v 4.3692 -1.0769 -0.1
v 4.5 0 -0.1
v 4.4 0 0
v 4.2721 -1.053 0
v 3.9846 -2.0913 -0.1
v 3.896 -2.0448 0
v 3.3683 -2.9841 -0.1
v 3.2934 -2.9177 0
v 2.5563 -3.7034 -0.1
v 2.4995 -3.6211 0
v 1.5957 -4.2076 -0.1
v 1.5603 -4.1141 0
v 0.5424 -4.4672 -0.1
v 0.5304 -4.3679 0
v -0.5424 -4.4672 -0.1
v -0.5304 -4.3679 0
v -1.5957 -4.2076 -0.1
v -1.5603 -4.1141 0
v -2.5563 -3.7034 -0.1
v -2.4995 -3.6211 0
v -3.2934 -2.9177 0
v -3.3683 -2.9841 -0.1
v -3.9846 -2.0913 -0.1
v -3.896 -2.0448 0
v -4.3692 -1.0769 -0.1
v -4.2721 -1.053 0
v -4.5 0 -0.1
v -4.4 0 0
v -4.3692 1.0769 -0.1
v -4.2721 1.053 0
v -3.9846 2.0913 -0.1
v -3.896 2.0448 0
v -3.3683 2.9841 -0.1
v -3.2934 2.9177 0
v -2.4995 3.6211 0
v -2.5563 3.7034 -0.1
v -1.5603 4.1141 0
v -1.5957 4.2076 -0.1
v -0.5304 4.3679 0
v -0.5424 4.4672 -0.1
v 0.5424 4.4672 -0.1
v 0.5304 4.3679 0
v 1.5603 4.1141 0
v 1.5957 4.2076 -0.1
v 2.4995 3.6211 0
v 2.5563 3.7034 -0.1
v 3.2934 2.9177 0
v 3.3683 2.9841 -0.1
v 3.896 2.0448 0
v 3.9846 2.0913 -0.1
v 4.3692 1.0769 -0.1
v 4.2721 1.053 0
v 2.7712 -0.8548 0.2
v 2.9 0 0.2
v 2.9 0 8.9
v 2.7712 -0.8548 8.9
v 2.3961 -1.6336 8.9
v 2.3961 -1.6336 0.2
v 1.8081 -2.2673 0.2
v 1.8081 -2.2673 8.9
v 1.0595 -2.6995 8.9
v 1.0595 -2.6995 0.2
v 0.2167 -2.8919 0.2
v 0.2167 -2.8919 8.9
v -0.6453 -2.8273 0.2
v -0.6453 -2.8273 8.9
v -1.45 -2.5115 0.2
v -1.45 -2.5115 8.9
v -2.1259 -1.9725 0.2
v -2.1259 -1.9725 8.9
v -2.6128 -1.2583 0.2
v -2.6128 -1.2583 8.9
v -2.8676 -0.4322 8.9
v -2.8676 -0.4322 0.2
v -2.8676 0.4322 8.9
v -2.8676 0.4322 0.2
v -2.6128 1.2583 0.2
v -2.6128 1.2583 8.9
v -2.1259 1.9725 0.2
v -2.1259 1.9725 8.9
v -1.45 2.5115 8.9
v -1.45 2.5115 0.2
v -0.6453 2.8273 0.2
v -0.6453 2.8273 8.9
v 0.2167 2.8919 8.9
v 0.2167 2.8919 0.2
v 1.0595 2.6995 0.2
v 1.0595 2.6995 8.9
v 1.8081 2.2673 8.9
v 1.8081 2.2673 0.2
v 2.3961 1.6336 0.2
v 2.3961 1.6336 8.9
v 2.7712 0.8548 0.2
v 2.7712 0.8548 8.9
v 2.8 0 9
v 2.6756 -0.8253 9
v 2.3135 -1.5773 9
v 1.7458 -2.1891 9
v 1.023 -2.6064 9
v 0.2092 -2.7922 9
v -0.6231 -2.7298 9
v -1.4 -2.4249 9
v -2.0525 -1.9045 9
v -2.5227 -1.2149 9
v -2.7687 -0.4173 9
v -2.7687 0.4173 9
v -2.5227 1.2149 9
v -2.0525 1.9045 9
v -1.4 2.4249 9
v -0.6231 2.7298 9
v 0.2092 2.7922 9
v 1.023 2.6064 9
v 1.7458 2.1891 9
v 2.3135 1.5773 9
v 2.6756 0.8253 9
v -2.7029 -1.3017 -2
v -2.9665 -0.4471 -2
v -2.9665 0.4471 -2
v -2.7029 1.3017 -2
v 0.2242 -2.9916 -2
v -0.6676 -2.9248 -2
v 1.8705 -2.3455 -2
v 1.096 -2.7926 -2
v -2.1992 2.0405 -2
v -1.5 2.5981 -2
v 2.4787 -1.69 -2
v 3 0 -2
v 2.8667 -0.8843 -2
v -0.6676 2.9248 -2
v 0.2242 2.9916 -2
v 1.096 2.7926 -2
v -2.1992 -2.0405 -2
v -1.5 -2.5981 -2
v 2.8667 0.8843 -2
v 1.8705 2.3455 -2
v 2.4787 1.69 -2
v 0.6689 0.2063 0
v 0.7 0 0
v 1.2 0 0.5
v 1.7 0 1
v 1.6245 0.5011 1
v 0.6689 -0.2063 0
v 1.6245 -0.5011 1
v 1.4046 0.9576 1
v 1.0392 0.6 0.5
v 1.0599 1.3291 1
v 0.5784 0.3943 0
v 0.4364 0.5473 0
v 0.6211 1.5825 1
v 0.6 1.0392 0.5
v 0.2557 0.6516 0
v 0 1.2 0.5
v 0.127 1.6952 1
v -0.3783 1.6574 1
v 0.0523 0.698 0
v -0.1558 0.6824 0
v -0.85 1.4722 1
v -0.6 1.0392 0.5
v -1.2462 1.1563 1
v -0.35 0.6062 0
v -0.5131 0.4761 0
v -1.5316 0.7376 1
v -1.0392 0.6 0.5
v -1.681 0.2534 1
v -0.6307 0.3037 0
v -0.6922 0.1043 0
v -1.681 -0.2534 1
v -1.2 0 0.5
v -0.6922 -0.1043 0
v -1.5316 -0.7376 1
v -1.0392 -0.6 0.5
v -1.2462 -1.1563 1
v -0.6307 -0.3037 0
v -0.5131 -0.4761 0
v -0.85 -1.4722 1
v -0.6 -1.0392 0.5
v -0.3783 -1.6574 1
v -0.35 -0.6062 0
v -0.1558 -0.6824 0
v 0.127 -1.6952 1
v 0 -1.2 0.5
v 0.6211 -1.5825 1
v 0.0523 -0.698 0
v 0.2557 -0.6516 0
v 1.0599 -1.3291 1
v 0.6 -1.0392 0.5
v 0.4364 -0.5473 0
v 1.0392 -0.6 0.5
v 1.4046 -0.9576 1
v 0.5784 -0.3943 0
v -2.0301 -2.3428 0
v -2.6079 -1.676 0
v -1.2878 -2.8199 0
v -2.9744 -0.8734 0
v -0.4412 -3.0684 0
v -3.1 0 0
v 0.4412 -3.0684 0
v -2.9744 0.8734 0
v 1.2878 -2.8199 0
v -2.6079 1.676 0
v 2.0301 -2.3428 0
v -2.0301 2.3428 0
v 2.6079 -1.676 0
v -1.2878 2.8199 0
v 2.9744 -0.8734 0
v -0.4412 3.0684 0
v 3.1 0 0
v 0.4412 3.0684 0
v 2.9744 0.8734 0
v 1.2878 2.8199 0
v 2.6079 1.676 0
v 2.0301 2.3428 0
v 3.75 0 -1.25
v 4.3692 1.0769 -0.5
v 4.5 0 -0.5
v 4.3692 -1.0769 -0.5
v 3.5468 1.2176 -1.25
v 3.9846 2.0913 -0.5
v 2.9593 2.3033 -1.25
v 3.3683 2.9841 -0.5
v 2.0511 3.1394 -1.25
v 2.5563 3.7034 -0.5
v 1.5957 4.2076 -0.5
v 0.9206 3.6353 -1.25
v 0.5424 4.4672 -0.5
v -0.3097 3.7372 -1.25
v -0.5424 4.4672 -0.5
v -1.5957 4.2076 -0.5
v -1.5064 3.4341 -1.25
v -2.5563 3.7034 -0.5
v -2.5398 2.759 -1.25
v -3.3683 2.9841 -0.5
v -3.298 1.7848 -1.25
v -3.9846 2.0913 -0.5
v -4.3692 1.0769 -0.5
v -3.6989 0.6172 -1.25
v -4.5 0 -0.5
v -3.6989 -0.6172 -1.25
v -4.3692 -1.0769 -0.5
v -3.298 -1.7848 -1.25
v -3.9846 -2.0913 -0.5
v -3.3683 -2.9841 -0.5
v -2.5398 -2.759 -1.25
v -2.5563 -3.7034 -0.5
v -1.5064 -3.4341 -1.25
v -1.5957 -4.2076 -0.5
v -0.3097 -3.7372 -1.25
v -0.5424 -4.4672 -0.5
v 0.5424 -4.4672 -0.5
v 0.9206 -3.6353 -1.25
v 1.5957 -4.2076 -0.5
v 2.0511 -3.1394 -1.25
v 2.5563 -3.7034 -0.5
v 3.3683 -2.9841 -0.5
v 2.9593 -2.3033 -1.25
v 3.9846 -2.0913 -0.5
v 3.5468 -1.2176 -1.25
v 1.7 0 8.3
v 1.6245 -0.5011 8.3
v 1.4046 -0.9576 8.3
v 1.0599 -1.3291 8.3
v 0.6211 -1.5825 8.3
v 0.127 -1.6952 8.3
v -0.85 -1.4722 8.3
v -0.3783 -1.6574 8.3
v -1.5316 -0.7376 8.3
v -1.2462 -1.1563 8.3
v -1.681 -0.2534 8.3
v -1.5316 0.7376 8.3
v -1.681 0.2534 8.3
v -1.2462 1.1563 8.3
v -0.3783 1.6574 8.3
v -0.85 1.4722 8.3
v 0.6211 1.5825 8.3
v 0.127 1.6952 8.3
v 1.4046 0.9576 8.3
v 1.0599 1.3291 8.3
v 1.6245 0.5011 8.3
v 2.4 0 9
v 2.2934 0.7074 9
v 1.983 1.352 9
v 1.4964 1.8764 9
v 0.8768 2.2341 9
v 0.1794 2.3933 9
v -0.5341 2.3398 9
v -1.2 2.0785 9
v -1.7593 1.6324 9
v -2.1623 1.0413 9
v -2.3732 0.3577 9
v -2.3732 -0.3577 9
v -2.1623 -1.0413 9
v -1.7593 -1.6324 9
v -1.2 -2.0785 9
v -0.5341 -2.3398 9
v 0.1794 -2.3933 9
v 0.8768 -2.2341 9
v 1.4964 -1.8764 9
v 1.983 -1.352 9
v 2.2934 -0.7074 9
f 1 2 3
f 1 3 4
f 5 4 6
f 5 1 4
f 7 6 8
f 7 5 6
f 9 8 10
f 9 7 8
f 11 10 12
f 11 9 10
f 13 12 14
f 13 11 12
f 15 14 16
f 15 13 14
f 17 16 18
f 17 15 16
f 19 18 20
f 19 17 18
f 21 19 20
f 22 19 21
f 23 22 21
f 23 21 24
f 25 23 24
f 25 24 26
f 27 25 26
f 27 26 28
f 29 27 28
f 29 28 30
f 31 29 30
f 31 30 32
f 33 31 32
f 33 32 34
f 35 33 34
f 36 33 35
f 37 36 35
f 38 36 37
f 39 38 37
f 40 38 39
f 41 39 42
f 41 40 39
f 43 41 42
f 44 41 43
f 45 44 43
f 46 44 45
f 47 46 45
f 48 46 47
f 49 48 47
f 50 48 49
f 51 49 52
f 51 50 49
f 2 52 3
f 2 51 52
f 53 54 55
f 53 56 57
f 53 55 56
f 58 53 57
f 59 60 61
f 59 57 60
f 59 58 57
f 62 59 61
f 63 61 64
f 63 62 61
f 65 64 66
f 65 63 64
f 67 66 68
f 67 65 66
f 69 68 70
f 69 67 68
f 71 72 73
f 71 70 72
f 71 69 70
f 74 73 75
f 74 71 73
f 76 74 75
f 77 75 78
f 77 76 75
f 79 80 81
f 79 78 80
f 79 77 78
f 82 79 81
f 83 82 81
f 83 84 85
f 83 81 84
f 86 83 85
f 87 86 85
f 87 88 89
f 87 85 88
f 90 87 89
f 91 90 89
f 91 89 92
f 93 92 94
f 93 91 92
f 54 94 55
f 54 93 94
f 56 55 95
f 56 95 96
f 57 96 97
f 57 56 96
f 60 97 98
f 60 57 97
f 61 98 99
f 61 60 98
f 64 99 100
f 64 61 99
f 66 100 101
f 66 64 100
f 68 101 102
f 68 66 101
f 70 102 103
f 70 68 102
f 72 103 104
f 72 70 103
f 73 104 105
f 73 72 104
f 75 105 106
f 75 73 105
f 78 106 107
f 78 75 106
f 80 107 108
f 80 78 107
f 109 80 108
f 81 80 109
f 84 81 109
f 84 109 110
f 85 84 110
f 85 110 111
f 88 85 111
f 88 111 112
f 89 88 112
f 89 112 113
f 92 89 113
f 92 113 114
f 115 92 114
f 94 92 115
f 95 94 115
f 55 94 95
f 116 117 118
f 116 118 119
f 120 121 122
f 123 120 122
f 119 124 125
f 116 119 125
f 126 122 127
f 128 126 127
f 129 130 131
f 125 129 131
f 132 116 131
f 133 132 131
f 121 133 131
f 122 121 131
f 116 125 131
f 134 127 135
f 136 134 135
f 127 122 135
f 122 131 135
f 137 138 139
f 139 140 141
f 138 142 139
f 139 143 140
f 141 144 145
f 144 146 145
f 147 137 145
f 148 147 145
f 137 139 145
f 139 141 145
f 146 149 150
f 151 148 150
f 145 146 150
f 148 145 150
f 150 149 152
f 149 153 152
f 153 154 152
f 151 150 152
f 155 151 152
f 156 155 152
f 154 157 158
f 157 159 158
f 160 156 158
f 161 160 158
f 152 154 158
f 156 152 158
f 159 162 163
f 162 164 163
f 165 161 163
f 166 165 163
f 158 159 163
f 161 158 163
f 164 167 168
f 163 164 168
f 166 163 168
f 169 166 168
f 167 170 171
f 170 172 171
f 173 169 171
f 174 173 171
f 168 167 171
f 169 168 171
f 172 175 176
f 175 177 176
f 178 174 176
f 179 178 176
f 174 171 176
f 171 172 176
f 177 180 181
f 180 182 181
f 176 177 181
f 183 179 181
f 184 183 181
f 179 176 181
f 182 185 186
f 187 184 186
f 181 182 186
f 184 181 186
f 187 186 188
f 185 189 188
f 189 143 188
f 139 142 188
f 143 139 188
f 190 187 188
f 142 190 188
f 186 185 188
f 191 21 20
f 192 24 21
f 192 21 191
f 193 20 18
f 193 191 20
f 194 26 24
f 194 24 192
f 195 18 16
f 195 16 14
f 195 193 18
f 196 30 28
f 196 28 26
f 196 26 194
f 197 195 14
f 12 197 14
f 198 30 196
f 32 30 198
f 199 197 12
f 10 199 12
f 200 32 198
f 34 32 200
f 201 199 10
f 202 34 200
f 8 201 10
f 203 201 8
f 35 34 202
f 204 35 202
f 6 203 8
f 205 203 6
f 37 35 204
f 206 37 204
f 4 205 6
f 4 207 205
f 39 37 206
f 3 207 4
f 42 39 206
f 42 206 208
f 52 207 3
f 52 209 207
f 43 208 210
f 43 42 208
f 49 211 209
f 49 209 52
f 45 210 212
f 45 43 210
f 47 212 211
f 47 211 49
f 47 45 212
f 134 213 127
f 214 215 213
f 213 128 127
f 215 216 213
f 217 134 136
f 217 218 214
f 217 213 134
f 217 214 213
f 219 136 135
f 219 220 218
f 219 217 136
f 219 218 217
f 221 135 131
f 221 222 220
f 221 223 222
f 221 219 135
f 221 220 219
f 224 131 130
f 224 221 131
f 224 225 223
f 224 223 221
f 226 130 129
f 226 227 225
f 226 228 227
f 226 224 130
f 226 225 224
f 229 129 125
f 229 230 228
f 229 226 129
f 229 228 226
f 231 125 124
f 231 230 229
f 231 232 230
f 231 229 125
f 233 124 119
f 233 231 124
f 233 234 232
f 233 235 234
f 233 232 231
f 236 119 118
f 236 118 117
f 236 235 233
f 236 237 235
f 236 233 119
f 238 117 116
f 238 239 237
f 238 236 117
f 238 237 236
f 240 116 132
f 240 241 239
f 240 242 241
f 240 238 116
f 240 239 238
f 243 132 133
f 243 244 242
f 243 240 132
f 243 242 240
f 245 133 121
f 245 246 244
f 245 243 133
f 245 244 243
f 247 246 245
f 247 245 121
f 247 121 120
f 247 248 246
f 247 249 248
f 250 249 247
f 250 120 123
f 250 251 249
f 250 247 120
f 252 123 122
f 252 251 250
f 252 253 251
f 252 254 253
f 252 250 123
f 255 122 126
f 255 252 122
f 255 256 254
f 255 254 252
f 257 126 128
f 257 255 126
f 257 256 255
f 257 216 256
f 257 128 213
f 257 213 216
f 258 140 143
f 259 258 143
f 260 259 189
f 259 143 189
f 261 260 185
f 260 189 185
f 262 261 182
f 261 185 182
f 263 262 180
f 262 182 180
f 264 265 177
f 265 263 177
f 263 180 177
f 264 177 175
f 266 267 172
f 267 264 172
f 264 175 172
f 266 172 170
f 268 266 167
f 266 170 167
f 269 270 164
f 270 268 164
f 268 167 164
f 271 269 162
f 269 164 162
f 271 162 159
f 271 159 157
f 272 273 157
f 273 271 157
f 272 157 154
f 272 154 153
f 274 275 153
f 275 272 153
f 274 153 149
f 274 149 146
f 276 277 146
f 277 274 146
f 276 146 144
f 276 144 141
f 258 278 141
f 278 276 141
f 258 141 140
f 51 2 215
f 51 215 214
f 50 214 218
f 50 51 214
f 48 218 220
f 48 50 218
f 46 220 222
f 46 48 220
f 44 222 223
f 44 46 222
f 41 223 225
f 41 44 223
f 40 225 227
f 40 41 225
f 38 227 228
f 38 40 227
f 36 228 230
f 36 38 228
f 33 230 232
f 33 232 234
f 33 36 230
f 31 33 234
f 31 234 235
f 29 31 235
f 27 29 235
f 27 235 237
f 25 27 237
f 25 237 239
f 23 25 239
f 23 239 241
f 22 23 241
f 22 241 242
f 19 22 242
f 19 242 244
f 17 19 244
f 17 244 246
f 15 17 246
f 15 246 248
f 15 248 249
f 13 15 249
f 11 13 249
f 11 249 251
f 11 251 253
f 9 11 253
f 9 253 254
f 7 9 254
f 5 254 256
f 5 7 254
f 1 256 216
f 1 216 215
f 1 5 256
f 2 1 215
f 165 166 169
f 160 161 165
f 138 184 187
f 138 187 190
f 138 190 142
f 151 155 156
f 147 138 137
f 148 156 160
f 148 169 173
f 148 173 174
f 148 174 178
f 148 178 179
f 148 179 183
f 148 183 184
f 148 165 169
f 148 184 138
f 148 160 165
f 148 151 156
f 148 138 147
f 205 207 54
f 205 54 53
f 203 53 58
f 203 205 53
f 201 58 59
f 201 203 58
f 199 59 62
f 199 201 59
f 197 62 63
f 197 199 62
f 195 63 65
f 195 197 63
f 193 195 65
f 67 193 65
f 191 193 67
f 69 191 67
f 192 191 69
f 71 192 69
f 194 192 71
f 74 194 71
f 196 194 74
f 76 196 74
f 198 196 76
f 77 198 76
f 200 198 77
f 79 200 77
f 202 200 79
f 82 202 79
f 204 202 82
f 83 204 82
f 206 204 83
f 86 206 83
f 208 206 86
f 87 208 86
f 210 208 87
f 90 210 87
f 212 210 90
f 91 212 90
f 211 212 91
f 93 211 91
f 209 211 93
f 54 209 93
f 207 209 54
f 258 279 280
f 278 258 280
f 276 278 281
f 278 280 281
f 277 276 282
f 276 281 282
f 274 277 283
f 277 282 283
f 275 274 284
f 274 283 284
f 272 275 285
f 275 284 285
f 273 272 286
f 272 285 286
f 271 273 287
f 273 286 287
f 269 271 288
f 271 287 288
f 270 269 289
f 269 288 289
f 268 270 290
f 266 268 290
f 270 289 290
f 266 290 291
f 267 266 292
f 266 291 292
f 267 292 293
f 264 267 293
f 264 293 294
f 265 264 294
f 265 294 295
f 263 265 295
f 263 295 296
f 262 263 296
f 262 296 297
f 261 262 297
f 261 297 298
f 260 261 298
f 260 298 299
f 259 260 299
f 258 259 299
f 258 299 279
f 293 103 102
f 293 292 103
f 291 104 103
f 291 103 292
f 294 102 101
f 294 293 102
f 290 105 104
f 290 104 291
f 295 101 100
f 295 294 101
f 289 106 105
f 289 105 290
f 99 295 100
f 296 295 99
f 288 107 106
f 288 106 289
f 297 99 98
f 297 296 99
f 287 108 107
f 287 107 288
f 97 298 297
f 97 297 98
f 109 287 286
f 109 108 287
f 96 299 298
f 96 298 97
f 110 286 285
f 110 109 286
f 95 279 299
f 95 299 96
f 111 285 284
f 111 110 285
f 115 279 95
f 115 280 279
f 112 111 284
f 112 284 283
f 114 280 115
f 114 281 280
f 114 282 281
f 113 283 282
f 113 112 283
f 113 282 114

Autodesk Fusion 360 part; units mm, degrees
sketch "Esquisse1" plane through (0, 0, 0) normal (0, 0, 1) x (1, 0, 0)
  circle A0 centre (0, 0) radius 4.5
  circle A1 centre (0, 0) radius 2.9
  circle A2 centre (0, 0) radius 1.7
  dimension "d1" = 5.8
  dimension "d2" = 3.4
  dimension "d3" = 9
extrude "Extrusion1" add sketch "Esquisse1" along normal blind 9 contours A1
extrude "Extrusion2" add sketch "Esquisse1" against normal blind 2 contours A0 | A1 | A2
chamfer "Chanfrein1" distance 1 angle 45 1 edges at (-1.585, 0.6147, 0)
chamfer "Chanfrein2" distance 1.5 angle 45 1 edges at (-4.1955, 1.6273, -2)
chamfer "Chanfrein3" distance 0.7 angle 45 1 edges at (-1.585, 0.6147, 9)
chamfer "Chanfrein4" distance 0.1 angle 45 1 edges at (-2.7037, -1.0487, 9)
chamfer "Chanfrein5" distance 0.1 angle 45 1 edges at (-4.1955, -1.6273, 0)
chamfer "Chanfrein6" distance 0.2 angle 45 1 edges at (-2.7037, -1.0487, 0)
